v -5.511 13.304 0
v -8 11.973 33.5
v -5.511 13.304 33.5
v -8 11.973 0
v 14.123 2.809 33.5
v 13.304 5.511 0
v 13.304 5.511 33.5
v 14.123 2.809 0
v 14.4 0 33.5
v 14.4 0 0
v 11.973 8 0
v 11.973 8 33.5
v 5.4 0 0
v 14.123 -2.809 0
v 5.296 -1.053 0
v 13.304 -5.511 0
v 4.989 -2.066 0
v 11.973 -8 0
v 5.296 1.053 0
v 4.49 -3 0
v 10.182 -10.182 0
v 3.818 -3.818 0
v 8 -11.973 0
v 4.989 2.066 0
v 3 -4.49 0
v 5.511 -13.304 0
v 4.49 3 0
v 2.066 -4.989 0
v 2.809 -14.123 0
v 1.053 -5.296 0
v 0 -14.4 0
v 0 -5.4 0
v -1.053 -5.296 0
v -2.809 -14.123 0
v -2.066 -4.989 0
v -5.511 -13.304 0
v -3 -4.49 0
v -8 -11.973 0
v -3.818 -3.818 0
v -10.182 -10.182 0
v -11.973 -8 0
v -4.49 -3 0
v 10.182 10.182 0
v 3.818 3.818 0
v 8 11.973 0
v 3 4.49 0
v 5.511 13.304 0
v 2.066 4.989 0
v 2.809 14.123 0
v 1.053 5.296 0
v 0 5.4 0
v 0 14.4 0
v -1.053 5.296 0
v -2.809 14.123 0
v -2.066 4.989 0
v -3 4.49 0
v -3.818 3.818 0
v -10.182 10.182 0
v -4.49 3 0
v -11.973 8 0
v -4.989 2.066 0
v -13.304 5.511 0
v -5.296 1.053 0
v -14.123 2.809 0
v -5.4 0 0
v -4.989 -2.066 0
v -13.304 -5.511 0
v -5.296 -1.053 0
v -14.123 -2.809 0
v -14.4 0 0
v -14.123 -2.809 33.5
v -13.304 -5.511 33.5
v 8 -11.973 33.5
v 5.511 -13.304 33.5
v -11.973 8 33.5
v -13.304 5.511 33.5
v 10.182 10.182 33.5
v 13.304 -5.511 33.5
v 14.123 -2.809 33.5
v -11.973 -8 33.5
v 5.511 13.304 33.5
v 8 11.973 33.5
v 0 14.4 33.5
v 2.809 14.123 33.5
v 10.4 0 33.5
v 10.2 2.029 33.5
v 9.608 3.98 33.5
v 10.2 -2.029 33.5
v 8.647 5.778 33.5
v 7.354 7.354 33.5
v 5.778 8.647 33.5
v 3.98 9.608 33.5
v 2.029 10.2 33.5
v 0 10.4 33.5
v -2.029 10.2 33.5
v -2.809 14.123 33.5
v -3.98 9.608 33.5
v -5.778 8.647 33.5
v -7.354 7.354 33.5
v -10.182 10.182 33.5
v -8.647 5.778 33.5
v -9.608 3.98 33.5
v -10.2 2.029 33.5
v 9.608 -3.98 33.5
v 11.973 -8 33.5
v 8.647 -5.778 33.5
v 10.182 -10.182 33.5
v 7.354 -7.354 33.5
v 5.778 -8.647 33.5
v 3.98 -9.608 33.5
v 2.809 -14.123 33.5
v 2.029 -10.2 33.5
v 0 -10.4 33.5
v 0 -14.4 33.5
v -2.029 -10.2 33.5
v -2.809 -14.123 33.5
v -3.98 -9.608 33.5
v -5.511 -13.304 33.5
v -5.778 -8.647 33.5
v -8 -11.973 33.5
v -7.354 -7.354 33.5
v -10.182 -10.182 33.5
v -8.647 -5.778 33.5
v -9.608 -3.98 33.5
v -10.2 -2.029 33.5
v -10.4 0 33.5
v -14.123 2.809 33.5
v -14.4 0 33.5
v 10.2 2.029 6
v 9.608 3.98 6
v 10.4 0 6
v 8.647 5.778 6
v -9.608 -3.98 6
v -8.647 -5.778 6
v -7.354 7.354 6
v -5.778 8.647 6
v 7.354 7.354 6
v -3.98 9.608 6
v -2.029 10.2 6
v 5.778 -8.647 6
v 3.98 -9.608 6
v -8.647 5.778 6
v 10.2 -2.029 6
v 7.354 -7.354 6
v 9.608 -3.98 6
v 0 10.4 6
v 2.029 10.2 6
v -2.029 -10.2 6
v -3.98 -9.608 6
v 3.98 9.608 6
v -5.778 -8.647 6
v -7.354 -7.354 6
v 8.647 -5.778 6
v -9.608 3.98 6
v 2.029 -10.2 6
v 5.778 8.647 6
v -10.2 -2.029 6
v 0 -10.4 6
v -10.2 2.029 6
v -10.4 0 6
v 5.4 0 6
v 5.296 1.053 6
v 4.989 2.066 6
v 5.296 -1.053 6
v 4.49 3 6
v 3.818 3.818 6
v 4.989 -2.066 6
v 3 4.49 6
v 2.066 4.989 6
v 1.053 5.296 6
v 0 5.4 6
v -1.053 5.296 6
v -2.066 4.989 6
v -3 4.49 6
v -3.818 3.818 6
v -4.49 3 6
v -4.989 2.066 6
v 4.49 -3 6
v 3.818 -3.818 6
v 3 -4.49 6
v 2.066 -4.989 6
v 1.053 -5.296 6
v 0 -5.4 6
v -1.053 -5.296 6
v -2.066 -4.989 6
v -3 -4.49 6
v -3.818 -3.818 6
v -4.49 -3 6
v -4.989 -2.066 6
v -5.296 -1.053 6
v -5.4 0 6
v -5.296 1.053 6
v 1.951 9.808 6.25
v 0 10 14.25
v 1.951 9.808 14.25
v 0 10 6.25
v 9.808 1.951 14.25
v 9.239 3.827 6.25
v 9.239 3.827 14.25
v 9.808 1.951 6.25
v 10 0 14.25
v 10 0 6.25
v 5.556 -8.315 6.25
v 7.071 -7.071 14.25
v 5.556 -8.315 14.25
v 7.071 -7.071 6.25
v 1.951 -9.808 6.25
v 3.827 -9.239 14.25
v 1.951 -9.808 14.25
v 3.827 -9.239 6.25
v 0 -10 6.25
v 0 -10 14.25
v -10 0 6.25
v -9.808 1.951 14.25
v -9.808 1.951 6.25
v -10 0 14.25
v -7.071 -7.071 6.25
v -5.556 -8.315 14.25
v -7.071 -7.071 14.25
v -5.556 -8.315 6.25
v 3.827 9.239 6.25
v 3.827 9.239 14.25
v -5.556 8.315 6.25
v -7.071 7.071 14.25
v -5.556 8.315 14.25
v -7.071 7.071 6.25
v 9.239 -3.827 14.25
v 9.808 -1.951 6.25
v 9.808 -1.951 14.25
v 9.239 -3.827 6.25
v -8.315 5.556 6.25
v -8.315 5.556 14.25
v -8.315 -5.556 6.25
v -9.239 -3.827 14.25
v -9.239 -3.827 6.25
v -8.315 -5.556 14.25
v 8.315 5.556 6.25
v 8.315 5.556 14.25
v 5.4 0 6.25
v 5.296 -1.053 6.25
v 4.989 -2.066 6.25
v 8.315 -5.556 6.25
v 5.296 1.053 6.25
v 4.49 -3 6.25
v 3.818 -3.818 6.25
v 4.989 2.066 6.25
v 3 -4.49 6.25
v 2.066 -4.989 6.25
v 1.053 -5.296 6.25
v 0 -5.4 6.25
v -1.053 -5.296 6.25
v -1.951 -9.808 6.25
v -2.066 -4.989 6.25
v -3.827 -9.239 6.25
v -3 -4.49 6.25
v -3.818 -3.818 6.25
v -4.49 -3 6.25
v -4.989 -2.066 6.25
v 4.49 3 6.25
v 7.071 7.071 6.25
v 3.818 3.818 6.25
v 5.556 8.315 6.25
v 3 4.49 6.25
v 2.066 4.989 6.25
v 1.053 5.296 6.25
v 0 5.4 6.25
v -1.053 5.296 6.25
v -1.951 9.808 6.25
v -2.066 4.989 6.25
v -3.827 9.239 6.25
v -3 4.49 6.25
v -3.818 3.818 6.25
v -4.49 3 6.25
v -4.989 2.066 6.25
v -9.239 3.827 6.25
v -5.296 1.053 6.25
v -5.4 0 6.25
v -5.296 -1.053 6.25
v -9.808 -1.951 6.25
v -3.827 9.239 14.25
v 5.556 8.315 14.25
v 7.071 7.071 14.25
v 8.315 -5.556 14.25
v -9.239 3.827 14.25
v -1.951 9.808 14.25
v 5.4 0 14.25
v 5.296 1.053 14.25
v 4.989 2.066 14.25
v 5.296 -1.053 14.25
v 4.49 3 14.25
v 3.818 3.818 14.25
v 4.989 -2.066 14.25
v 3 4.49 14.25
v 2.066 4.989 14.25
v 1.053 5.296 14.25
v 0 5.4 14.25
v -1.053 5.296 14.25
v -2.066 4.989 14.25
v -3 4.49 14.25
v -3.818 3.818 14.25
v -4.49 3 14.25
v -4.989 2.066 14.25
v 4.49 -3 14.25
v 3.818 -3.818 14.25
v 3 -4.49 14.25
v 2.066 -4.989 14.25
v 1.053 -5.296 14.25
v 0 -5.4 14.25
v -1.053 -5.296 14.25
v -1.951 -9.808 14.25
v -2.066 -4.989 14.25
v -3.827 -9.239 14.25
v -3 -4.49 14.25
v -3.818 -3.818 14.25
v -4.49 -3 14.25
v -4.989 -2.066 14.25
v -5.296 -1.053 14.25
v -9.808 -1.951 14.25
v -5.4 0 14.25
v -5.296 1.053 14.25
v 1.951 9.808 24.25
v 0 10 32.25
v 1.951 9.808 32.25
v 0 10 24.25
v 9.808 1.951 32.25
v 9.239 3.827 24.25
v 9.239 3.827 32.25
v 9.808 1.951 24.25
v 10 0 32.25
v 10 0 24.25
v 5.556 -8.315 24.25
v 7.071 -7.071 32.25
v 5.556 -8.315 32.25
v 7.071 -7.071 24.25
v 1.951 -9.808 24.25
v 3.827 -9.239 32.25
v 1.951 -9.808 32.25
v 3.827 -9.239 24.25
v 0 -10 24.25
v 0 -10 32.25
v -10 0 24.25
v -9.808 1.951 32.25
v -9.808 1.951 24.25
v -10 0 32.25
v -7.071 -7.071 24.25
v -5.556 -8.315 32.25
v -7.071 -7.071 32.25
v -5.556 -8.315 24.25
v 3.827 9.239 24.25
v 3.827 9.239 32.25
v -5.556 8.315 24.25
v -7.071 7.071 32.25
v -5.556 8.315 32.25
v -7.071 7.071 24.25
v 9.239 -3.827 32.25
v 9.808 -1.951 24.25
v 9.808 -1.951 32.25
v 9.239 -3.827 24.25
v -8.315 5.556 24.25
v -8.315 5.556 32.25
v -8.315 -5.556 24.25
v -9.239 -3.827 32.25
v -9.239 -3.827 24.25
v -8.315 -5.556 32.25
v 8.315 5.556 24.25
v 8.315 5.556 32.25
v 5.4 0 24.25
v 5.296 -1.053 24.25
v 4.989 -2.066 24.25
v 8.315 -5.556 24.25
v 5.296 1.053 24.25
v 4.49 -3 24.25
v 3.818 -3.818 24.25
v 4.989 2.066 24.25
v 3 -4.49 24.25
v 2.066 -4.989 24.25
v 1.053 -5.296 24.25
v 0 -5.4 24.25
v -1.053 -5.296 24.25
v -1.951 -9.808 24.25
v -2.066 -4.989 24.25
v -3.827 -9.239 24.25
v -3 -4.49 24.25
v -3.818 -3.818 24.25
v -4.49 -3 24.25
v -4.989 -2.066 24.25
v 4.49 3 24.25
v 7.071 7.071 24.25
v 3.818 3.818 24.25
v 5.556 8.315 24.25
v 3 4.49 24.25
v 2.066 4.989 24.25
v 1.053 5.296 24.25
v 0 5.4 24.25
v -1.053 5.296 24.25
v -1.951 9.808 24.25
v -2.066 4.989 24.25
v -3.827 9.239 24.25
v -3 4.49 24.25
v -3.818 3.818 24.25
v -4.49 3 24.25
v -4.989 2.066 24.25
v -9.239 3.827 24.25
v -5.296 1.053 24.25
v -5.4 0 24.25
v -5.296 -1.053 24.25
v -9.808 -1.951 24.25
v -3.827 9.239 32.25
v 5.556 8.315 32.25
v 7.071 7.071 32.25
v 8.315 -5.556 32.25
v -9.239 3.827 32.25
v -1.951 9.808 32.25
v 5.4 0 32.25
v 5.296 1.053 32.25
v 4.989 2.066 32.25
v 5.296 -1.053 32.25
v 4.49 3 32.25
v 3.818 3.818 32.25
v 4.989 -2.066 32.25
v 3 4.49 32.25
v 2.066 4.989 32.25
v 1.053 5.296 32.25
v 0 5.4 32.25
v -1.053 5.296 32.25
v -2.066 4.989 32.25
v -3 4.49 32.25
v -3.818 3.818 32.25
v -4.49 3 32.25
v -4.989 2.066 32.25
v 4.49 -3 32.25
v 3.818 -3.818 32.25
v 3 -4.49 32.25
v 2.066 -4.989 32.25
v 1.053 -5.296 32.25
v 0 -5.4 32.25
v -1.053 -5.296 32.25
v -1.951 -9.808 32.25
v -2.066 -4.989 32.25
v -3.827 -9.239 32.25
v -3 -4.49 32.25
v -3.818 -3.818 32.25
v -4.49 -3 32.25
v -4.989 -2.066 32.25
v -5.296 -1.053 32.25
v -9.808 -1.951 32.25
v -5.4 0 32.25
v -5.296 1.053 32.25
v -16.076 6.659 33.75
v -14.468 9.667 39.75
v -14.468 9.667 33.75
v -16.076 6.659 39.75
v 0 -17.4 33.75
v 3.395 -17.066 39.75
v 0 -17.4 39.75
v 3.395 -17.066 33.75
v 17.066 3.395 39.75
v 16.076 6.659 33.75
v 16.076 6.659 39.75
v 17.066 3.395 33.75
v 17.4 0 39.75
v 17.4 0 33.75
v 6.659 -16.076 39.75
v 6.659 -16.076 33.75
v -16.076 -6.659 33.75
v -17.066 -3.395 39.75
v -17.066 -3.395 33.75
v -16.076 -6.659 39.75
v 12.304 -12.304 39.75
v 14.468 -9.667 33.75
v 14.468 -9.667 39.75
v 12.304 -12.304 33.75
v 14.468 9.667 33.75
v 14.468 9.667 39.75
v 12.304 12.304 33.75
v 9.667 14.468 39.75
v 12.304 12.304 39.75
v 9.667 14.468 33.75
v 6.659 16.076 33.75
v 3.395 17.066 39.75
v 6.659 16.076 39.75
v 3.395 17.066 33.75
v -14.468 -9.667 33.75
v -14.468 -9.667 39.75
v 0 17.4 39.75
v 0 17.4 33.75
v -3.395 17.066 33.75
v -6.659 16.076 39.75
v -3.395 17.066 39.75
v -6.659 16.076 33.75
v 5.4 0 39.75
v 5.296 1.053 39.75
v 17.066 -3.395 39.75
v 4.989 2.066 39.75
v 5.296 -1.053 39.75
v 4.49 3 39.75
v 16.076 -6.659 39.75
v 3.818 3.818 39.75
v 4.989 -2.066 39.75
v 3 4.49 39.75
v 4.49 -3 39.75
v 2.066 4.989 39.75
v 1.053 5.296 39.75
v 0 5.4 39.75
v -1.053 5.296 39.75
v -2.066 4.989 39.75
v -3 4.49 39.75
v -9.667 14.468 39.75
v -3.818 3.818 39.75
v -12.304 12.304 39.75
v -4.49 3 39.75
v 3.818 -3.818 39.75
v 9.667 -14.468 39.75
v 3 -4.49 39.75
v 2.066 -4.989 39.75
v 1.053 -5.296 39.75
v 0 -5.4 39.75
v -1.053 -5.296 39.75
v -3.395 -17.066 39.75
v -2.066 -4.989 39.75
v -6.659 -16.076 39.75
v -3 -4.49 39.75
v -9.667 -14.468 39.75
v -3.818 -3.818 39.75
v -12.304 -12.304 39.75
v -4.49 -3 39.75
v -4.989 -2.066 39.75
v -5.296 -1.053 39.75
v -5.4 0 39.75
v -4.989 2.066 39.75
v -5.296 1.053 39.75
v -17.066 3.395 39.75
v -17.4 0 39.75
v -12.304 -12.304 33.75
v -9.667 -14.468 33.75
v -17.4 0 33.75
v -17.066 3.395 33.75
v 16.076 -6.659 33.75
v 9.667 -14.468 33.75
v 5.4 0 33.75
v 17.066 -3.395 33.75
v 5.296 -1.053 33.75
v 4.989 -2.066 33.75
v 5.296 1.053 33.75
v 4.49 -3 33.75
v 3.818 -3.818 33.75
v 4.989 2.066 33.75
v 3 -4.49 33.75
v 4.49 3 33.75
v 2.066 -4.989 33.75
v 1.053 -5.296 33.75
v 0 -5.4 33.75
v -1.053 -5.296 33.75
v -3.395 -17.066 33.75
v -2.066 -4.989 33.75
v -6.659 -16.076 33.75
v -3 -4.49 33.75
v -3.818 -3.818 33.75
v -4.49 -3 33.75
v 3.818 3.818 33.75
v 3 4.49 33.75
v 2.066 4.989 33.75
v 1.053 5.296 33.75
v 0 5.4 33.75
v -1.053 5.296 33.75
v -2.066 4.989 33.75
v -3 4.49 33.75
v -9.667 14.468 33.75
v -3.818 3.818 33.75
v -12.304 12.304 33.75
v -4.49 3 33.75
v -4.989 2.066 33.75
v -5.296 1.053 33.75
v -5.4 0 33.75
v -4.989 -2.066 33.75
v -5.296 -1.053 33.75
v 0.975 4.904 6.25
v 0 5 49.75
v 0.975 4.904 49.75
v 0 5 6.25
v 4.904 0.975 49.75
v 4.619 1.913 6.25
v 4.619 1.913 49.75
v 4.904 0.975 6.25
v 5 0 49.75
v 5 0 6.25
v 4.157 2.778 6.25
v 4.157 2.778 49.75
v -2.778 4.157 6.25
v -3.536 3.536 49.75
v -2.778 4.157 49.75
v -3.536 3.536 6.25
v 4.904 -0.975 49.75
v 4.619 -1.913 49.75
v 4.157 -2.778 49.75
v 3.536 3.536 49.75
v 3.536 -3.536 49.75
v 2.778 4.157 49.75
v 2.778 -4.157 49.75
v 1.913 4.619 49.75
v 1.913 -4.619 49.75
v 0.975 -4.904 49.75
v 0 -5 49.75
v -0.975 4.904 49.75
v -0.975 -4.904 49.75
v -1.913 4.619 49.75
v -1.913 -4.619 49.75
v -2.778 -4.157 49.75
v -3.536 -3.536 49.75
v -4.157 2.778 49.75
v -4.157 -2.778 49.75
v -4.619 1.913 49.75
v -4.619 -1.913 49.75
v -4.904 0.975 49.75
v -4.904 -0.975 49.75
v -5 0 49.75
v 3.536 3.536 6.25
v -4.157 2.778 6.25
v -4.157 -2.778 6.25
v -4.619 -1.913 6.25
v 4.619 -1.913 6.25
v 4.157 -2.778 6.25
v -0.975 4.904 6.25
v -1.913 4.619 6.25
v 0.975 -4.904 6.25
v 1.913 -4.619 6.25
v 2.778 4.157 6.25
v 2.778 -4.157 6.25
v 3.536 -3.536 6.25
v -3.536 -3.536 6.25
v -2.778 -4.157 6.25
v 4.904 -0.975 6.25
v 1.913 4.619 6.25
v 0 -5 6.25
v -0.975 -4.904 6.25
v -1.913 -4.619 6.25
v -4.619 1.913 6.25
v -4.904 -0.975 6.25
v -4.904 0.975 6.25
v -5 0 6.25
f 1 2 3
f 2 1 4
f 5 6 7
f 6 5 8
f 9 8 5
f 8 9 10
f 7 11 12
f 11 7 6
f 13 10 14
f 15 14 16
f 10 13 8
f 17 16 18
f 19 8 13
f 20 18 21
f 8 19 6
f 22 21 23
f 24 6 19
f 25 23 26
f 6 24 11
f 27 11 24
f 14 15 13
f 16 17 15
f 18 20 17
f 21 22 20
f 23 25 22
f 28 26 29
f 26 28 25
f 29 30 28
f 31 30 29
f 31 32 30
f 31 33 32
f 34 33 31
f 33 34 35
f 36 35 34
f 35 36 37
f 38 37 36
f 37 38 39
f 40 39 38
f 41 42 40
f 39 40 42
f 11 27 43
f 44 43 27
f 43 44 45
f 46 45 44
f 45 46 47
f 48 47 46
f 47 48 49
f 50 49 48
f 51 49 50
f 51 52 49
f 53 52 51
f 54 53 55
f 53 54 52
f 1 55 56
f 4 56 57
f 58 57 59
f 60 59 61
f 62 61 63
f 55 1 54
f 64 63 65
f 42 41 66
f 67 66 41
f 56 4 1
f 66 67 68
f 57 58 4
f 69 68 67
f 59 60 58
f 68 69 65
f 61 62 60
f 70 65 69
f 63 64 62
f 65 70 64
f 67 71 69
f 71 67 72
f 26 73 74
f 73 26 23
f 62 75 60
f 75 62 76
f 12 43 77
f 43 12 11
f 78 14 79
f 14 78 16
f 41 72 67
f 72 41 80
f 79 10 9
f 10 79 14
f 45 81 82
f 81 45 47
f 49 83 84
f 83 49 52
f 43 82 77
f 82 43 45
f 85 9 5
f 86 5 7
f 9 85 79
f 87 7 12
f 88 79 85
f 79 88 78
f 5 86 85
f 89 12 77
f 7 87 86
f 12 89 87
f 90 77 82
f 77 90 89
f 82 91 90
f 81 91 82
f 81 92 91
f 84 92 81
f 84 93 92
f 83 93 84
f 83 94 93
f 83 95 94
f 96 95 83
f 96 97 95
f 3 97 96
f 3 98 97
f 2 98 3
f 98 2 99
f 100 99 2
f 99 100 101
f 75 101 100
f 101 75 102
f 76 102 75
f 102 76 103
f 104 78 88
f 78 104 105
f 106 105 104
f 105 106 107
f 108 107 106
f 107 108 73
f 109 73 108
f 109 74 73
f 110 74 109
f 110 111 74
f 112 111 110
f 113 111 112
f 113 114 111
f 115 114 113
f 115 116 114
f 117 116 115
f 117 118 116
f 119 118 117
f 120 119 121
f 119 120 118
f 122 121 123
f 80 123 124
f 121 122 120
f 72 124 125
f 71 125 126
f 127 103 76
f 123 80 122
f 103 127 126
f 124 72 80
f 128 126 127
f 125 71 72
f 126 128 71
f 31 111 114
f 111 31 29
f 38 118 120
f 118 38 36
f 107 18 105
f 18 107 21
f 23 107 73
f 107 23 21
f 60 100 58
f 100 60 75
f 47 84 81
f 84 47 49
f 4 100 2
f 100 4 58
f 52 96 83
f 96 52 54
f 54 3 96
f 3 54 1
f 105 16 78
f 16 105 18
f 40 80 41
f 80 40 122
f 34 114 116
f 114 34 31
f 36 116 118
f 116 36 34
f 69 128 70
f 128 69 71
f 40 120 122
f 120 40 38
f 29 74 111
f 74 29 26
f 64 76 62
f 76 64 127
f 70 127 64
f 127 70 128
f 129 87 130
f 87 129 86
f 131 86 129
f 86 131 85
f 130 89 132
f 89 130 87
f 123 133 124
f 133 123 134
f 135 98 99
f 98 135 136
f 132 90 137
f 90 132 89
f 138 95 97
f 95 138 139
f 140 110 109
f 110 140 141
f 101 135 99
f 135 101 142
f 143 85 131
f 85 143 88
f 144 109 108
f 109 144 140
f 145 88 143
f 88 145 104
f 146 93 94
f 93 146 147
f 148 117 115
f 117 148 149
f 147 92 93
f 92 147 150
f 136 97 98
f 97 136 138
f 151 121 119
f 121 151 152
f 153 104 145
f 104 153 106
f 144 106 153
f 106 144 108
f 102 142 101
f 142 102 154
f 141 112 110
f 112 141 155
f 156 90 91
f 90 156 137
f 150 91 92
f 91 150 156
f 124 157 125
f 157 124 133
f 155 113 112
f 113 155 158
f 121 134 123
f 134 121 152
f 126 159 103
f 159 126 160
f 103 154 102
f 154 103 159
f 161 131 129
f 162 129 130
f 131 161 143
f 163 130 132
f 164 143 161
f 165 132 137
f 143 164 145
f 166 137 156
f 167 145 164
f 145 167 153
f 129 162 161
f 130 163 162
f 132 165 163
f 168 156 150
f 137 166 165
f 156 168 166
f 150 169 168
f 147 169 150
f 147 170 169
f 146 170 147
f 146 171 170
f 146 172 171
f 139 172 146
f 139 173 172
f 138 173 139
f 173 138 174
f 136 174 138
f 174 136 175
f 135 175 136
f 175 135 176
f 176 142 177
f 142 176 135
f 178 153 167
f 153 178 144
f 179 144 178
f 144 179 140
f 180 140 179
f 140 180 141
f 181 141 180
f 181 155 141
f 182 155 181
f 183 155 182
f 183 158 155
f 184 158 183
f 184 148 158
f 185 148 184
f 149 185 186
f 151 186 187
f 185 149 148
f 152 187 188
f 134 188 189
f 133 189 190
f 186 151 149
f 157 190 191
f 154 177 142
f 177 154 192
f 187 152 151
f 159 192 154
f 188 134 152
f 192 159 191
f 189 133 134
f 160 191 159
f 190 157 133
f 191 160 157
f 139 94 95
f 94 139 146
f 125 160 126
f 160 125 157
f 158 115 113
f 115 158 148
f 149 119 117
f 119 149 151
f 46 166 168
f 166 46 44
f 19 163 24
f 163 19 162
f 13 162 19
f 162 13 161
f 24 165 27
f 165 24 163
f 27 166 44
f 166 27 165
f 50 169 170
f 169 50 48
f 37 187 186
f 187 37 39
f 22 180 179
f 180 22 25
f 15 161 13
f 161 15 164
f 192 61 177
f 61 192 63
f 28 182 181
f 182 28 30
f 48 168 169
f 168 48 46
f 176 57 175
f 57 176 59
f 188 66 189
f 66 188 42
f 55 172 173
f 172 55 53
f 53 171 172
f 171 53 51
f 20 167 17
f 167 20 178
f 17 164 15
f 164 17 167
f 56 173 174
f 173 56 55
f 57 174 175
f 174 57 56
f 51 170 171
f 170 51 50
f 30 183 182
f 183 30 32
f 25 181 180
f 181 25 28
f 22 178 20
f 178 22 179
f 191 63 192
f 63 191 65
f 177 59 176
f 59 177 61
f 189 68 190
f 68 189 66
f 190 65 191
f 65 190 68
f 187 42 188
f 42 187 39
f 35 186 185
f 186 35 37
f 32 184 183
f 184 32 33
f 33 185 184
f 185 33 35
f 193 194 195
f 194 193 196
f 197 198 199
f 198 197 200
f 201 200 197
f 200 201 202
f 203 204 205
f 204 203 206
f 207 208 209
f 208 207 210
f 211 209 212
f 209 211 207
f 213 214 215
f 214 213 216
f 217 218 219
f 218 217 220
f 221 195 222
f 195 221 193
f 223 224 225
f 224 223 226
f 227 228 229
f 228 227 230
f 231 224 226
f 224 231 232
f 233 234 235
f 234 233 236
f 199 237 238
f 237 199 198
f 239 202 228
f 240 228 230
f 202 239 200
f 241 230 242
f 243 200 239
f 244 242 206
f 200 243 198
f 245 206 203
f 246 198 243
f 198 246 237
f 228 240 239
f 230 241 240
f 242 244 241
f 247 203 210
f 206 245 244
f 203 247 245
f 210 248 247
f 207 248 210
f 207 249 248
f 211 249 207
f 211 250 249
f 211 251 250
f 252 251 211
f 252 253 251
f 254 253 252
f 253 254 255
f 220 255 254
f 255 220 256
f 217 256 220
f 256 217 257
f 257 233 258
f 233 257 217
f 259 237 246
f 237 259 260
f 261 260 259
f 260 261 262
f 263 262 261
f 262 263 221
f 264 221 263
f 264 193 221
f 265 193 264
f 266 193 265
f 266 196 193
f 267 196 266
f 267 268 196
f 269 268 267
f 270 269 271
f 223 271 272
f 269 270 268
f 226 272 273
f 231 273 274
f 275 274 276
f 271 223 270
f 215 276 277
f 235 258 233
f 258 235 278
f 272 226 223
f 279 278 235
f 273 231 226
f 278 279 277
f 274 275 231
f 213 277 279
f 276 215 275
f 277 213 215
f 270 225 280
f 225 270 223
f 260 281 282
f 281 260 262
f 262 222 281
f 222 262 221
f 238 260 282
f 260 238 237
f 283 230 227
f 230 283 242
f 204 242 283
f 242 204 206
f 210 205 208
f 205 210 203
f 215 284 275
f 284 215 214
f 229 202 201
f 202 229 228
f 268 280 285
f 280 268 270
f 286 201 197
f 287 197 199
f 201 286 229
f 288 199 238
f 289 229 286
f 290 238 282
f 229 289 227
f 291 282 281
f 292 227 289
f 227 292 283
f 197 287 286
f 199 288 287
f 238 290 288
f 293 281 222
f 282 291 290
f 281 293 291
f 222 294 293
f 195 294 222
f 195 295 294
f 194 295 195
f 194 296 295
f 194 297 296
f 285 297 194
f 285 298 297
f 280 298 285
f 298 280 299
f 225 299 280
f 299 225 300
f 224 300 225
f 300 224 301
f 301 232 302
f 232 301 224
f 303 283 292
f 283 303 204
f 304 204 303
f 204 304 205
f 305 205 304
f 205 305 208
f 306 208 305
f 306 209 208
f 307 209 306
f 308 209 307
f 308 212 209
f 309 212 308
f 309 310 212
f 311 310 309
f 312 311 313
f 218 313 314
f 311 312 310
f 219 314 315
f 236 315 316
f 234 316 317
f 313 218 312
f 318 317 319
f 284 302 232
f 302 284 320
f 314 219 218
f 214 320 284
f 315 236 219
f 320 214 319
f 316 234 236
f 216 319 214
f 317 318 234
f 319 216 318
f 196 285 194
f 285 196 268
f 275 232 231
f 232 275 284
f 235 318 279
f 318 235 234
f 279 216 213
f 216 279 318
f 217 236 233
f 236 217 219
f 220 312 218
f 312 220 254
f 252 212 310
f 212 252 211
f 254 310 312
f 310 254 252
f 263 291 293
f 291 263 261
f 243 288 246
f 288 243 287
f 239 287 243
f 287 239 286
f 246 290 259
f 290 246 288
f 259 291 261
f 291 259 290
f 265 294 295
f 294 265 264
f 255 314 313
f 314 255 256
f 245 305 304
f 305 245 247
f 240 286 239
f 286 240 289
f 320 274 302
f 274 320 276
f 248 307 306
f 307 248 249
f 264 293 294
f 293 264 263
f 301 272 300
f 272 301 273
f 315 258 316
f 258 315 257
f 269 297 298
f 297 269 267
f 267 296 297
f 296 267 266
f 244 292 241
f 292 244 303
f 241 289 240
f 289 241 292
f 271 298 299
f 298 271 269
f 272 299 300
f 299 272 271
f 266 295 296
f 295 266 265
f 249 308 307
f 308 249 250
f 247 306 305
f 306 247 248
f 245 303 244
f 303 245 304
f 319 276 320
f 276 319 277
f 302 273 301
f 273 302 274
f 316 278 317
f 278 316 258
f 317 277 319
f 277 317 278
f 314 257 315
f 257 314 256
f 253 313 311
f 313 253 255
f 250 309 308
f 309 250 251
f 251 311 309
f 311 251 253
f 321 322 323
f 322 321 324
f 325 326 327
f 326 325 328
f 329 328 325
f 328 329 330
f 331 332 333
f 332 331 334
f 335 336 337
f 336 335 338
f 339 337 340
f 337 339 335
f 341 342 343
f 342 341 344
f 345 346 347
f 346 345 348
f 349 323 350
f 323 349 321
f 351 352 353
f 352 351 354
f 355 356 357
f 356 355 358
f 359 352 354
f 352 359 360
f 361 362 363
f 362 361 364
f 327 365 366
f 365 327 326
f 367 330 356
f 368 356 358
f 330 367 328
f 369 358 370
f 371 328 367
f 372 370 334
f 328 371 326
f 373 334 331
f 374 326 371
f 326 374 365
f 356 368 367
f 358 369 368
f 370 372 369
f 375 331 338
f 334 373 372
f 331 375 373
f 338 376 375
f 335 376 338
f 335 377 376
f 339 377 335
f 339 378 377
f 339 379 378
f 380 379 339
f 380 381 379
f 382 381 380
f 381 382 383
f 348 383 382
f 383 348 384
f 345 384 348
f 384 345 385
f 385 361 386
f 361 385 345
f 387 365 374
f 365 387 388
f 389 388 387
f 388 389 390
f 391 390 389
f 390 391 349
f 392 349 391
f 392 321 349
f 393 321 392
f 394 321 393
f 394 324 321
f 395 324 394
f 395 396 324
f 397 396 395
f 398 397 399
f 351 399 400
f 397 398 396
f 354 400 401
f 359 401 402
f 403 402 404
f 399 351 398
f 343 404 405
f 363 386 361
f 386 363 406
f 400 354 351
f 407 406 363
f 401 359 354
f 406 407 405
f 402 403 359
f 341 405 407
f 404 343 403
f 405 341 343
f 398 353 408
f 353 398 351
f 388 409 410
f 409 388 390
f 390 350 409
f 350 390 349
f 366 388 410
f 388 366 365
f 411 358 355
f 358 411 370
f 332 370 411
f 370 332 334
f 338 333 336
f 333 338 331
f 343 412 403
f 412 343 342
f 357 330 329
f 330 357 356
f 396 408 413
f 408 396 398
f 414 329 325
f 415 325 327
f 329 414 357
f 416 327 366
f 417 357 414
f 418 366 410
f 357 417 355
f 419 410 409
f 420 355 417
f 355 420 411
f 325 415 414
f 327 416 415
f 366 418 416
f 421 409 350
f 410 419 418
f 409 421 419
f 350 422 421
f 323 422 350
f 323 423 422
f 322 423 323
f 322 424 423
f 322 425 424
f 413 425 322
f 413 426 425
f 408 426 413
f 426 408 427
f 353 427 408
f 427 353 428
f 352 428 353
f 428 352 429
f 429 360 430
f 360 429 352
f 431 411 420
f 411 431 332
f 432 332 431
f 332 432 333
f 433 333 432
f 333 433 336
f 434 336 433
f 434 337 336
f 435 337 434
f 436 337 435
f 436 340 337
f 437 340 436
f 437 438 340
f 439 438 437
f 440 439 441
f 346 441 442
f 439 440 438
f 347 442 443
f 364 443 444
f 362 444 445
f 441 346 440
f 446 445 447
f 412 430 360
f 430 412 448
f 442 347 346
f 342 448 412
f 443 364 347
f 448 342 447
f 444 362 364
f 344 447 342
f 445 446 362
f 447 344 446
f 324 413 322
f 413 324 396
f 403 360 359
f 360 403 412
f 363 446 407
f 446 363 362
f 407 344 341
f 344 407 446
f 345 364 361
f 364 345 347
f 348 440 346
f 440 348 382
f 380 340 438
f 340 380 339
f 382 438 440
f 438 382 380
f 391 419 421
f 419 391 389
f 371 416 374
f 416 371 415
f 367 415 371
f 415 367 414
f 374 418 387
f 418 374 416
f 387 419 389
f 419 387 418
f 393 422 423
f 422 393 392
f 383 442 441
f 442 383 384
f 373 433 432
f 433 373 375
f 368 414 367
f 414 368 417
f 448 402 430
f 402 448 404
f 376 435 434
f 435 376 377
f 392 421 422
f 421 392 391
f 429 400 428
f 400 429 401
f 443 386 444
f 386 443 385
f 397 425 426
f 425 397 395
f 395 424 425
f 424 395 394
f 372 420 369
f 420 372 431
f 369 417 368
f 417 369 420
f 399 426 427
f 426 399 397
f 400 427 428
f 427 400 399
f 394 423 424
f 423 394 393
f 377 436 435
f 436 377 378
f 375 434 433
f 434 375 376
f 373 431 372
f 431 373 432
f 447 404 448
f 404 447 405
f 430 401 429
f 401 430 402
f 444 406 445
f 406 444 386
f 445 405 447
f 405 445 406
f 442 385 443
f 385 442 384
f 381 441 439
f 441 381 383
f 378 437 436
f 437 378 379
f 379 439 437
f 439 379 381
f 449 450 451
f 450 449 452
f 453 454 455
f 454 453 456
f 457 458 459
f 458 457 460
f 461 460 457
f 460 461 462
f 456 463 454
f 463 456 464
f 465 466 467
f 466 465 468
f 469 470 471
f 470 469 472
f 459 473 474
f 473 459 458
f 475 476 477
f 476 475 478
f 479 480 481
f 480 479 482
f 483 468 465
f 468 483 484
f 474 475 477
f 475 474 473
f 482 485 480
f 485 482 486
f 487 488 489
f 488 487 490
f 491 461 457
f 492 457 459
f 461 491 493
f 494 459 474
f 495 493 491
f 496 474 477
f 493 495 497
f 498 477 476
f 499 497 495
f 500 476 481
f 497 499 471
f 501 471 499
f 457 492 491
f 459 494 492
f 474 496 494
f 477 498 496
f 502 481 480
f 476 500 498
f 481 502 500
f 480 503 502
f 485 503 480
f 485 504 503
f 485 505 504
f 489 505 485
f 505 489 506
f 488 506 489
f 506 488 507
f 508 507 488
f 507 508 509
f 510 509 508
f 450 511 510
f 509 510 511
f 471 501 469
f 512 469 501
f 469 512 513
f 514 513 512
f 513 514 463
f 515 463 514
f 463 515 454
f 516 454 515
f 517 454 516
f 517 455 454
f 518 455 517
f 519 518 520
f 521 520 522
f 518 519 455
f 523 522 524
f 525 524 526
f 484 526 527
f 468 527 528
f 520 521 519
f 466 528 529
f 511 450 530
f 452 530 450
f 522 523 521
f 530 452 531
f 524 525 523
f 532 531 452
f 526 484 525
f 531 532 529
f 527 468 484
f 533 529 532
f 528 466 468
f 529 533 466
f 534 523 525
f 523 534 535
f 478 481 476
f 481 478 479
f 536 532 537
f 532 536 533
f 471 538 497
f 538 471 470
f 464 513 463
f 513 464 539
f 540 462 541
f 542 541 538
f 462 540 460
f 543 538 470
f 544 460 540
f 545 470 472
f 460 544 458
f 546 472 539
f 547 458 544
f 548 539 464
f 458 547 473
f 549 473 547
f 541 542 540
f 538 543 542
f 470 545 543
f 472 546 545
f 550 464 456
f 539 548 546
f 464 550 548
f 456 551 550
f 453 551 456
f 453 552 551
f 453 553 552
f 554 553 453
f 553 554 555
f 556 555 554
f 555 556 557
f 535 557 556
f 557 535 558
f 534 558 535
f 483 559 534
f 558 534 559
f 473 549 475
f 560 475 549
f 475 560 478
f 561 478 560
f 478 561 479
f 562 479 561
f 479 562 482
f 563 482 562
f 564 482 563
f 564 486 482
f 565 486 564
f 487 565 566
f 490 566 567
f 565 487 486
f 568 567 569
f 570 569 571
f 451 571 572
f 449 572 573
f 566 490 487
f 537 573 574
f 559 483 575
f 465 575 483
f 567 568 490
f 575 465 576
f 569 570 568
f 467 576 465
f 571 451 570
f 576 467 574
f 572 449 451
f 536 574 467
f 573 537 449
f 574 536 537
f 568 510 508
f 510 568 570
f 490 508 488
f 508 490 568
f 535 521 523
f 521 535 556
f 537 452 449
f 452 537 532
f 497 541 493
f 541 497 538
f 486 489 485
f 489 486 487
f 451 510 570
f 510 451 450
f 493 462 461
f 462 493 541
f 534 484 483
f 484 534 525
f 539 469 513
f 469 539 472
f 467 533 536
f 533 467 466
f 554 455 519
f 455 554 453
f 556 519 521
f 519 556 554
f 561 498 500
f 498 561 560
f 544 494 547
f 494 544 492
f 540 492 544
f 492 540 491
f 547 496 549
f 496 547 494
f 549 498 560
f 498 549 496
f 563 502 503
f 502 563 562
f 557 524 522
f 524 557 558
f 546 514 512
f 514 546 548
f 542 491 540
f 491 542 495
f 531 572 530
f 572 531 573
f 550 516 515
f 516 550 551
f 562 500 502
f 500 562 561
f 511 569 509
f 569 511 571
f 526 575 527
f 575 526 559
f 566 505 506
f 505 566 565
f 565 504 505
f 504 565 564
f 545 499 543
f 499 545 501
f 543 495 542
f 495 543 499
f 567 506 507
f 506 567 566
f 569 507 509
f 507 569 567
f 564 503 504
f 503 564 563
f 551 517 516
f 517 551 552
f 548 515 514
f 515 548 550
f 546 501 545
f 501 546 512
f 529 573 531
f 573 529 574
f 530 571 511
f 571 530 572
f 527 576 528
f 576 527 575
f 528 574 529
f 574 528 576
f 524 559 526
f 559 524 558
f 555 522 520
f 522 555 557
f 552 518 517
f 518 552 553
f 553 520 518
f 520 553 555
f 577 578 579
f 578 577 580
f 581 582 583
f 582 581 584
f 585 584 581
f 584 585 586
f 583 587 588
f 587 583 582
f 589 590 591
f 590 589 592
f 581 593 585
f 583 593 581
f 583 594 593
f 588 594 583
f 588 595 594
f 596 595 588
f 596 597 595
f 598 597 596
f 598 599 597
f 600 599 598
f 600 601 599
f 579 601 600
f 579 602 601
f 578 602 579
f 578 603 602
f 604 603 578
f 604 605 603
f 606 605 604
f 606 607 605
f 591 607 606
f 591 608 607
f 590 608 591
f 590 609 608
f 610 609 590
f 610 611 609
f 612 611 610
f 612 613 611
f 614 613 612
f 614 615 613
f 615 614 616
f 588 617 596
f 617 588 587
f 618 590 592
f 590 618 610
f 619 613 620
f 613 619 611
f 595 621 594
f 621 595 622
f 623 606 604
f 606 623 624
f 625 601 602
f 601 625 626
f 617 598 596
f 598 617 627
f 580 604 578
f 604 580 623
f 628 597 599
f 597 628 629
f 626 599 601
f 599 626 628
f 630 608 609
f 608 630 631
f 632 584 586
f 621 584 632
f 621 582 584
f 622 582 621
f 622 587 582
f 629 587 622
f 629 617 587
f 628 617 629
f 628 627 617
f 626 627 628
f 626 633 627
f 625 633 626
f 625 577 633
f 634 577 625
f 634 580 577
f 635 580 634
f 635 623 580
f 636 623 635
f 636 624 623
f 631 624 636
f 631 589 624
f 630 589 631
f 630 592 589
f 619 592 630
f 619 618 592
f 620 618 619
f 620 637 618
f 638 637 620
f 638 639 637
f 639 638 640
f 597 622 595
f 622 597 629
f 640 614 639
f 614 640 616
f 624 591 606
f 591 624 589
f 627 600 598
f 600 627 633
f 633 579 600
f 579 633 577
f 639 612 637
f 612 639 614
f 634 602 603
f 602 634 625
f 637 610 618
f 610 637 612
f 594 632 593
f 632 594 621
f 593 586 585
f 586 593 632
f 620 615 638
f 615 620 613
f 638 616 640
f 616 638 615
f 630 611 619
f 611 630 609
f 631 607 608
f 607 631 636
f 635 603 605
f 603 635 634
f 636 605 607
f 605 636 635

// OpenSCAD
$fn = 32;

// ------------------------------------------------------------------------
// Shaft station: cup d28.8 x 33.5 mm, shaft d10
// Every part is its own module, assembly() places every instance.
// ------------------------------------------------------------------------

// --- part 1 ---
module housing_cup() {
  difference() {
    cylinder(h = 33.5, d = 28.8);
    translate([0, 0, 6]) cylinder(h = 28.5, d = 20.8);
    translate([0, 0, -1]) cylinder(h = 8, d = 10.8);
  }
}

// --- part 2 ---
module bearing_lower() {
  difference() {
      translate([0, 0, 0]) cylinder(h = 8, d = 20);
      translate([0, 0, -1]) cylinder(h = 10, d = 10.8);
    }
}

// --- part 3 ---
module bearing_upper() {
  difference() {
      translate([0, 0, 0]) cylinder(h = 8, d = 20);
      translate([0, 0, -1]) cylinder(h = 10, d = 10.8);
    }
}

// --- part 4 ---
module station_shaft() {
  translate([0, 0, -21.75]) cylinder(h = 43.5, d = 10);
}

// --- part 5 ---
module station_cover() {
  difference() {
    cylinder(h = 6, d = 34.8);
    translate([0, 0, -1]) cylinder(h = 8, d = 10.8);
  }
}

// --- assembly ---
module assembly() {
  color([0.80, 0.24, 0.20]) translate([0, 0, 0]) rotate([0, 0, 0]) housing_cup();
  color([0.20, 0.45, 0.75]) translate([0, 0, 6.25]) rotate([0, 0, 0]) bearing_lower();
  color([0.25, 0.62, 0.32]) translate([0, 0, 24.25]) rotate([0, 0, 0]) bearing_upper();
  color([0.92, 0.70, 0.18]) translate([0, 0, 28]) rotate([0, 0, 0]) station_shaft();
  color([0.58, 0.35, 0.70]) translate([0, 0, 33.75]) rotate([0, 0, 0]) station_cover();
}

assembly();
